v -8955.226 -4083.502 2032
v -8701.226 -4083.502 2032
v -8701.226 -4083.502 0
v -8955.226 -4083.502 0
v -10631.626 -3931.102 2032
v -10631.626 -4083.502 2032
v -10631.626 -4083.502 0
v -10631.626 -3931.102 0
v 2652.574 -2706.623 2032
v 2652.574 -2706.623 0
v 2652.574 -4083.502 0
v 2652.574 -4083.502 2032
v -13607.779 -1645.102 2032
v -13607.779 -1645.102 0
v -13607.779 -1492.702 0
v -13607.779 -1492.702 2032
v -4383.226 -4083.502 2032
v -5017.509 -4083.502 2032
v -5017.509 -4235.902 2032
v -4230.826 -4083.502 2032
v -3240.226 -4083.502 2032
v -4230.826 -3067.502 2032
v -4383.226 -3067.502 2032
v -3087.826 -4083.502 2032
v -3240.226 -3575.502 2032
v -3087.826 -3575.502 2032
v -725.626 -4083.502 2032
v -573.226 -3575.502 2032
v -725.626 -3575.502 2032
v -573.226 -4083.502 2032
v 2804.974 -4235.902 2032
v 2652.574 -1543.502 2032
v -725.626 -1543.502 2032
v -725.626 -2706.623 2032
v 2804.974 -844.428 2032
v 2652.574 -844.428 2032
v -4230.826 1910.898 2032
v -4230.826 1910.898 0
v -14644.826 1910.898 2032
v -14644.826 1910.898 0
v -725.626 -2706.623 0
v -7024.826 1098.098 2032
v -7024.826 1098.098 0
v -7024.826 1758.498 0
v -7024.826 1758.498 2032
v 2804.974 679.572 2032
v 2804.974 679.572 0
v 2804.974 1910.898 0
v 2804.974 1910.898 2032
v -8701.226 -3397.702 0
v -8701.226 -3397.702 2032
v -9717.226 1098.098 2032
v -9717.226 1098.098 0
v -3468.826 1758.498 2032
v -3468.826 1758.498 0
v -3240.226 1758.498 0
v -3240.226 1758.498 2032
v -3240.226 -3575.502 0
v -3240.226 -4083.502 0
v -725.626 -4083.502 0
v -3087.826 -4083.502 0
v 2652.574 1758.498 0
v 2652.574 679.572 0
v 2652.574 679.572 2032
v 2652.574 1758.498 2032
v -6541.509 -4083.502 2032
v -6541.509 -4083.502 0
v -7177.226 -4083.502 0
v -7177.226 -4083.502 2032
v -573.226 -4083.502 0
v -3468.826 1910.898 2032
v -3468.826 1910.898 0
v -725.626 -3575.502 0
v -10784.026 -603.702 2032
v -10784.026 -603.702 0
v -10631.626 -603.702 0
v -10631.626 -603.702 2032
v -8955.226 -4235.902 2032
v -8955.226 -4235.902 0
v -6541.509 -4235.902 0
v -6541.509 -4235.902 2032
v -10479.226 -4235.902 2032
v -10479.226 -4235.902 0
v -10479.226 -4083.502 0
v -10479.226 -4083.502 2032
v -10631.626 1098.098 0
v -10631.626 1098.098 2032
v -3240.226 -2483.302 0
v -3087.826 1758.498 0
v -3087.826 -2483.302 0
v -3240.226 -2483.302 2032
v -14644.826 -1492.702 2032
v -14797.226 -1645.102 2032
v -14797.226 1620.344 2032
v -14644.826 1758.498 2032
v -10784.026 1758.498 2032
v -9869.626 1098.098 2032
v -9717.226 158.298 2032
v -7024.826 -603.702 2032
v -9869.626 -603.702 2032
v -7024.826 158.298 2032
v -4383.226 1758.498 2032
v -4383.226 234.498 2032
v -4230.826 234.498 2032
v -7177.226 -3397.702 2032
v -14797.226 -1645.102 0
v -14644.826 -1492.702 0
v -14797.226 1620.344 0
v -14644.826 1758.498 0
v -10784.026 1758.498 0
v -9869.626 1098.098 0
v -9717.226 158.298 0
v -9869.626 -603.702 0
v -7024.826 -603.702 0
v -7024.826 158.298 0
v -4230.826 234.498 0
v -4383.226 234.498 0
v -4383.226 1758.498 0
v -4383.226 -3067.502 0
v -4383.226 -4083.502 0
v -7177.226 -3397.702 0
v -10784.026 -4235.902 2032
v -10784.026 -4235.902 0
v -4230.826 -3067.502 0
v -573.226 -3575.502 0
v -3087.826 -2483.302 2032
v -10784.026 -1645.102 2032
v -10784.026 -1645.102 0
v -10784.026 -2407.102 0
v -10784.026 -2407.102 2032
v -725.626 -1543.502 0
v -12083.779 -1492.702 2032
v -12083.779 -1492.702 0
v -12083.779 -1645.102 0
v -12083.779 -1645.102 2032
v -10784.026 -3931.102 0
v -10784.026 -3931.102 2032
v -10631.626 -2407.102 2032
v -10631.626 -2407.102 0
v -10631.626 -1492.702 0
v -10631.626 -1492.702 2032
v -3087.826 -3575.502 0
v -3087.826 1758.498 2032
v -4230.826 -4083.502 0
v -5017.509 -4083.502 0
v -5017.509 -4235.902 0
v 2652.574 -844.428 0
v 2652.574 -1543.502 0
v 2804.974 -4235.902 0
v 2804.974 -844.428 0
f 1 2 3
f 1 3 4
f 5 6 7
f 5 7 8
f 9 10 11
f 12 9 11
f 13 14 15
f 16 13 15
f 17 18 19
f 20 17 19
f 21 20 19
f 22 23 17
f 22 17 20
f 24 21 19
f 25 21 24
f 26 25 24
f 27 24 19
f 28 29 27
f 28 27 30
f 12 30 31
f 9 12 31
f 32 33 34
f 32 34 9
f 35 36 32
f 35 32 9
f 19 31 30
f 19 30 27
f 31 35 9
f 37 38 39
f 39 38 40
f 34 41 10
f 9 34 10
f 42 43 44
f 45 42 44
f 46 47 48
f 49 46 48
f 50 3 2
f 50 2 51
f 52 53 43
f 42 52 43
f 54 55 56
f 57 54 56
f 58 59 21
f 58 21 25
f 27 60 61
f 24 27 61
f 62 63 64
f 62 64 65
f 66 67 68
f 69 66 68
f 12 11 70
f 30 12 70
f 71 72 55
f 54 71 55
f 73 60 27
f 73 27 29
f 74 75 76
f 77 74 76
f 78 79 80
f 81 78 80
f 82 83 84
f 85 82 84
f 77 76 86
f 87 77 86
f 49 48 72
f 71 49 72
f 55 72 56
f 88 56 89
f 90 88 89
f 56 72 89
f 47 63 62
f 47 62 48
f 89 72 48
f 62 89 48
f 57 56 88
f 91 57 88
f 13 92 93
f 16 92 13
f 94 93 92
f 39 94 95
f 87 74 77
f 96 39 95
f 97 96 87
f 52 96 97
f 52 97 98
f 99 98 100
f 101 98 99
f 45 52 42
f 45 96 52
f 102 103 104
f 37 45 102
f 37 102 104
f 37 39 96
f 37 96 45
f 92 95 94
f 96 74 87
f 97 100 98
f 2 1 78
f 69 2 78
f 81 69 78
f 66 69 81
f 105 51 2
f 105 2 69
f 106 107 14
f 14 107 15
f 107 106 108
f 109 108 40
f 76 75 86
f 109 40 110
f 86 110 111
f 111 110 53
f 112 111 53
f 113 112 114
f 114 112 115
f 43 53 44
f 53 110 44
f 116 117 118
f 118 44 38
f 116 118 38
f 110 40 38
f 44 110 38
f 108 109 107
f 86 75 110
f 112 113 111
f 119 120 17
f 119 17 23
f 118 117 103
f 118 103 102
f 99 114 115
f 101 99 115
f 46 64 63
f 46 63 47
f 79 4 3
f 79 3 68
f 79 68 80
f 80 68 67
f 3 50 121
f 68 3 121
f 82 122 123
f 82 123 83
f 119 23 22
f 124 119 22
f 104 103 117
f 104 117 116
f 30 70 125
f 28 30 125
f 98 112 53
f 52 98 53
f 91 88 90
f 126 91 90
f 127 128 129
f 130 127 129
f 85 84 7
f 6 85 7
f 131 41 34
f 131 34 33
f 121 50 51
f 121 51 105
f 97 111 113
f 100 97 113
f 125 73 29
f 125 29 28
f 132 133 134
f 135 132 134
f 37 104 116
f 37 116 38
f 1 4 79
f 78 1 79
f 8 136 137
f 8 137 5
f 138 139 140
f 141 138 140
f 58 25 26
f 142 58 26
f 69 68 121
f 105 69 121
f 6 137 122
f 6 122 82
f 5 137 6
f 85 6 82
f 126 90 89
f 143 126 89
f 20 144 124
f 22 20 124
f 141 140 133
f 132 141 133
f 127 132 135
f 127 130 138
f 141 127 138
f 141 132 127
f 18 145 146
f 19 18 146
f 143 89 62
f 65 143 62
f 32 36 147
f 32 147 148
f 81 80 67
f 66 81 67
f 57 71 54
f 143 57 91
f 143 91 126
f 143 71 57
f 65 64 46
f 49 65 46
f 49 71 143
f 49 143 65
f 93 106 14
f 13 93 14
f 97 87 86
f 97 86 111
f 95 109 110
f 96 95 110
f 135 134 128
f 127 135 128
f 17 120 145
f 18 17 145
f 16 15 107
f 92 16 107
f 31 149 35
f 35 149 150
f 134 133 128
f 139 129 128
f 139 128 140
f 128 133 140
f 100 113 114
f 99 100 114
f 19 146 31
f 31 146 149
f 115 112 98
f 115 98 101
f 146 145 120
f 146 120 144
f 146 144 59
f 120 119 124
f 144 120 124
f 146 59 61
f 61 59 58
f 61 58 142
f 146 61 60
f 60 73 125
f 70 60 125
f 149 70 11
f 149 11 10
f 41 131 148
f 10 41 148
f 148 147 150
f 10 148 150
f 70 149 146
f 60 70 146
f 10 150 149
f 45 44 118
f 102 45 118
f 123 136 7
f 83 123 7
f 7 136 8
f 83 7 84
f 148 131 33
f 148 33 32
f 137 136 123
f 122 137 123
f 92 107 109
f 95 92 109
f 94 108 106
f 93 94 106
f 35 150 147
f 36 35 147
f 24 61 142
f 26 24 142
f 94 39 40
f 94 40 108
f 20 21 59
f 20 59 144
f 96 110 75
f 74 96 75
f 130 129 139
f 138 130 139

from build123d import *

# Parameters (mm, degrees)
F0_W     = 152.4
F0_H     = 1524
F0_W_2   = 2692.4
F0_H_2   = 660.4
F0_H_3   = 939.8
F0_H_4   = 762
F0_H_5   = 1701.8
F2_DEPTH = 2032
F0_W_3   = 3378.2
F0_H_6   = 1163.1207679749
F0_H_7   = 508
F0_H_8   = 1016
F0_H_9   = 1078.9255742073
F0_W_4   = 1524
F0_H_10  = 685.8
F0_H_11  = 152.4


with BuildPart() as f2:
    # F0 (on Top) → F2 (new body)
    with BuildSketch(Plane.XY):
        with Locations((-4307.0259521484, 996.4976905823)):
            Rectangle(F0_W, F0_H)
        Polygon((-4383.2259521484, 1758.4976905823), (-4230.8259521484, 1758.4976905823), (-4230.8259521484, 1910.8976905823), (-14644.8259521484, 1910.8976905823), (-14644.8259521484, 1758.4976905823), (-10784.0259521484, 1758.4976905823), (-10631.6259521484, 1758.4976905823), (-9869.6259521484, 1758.4976905823), (-9717.2259521484, 1758.4976905823), (-7024.8259521484, 1758.4976905823), align=None)
        with Locations((-8371.0259521484, 1428.2976905823)):
            Rectangle(F0_W_2, F0_H_2)
        Polygon((-14644.8259521484, 1758.4976905823), (-14644.8259521484, 1910.8976905823), (-14797.2259521484, 1620.3435659409), (-14797.2259521484, -1645.1023094177), (-13607.7785491943, -1645.1023094177), (-13607.7785491943, -1492.7023094177), (-14644.8259521484, -1492.7023094177), align=None)
        with Locations((-9793.4259521484, 1428.2976905823)):
            Rectangle(F0_W, F0_H_2)
        with Locations((-9793.4259521484, 628.1976905823)):
            Rectangle(F0_W, F0_H_3)
        Polygon((-9869.6259521484, 1098.0976905823), (-9869.6259521484, 1758.4976905823), (-10631.6259521484, 1758.4976905823), (-10784.0259521484, 1758.4976905823), (-10784.0259521484, 1098.0976905823), (-10631.6259521484, 1098.0976905823), align=None)
        with Locations((-9793.4259521484, -222.7023094177)):
            Rectangle(F0_W, F0_H_4)
        with Locations((-8371.0259521484, -222.7023094177)):
            Rectangle(F0_W_2, F0_H_4)
        with Locations((-10707.8259521484, 247.1976905823)):
            Rectangle(F0_W, F0_H_5)
    extrude(amount=F2_DEPTH)


with BuildPart() as f2b:
    # F0 (on Top) → F2, piece 2 (new body)
    with BuildSketch(Plane.XY):
        Polygon((2804.9740478516, -844.427883625), (2652.5740478516, -844.427883625), (2652.5740478516, -1543.5023094177), (2652.5740478516, -2706.6230773926), (2652.5740478516, -4083.5023094177), (-573.2259521484, -4083.5023094177), (-725.6259521484, -4083.5023094177), (-3087.8259521484, -4083.5023094177), (-3240.2259521484, -4083.5023094177), (-4230.8259521484, -4083.5023094177), (-4383.2259521484, -4083.5023094177), (-5017.5086746216, -4083.5023094177), (-5017.5086746216, -4235.9023094177), (2804.9740478516, -4235.9023094177), align=None)
        with Locations((963.4740478516, -2125.0626934051)):
            Rectangle(F0_W_3, F0_H_6)
        with Locations((-649.4259521484, -3829.5023094177)):
            Rectangle(F0_W, F0_H_7)
        with Locations((-4307.0259521484, -3575.5023094177)):
            Rectangle(F0_W, F0_H_8)
        with Locations((-3164.0259521484, -3829.5023094177)):
            Rectangle(F0_W, F0_H_7)
    extrude(amount=F2_DEPTH)


with BuildPart() as f2c:
    # F0 (on Top) → F2, piece 3 (new body)
    with BuildSketch(Plane.XY):
        with Locations((2728.7740478516, 1219.0349034786)):
            Rectangle(F0_W, F0_H_9)
        Polygon((-3087.8259521484, 1758.4976905823), (2652.5740478516, 1758.4976905823), (2804.9740478516, 1758.4976905823), (2804.9740478516, 1910.8976905823), (-3468.8259521484, 1910.8976905823), (-3468.8259521484, 1758.4976905823), (-3240.2259521484, 1758.4976905823), align=None)
        Polygon((-3087.8259521484, -1543.5023094177), (-3087.8259521484, 1758.4976905823), (-3240.2259521484, 1758.4976905823), (-3240.2259521484, -2483.3023094177), (-3087.8259521484, -2483.3023094177), align=None)
    extrude(amount=F2_DEPTH)


with BuildPart() as f2d:
    # F0 (on Top) → F2, piece 4 (new body)
    with BuildSketch(Plane.XY):
        Polygon((-6541.5086746216, -4235.9023094177), (-6541.5086746216, -4083.5023094177), (-7177.2259521484, -4083.5023094177), (-8701.2259521484, -4083.5023094177), (-8955.2259521484, -4083.5023094177), (-8955.2259521484, -4235.9023094177), align=None)
        with Locations((-7939.2259521484, -3740.6023094177)):
            Rectangle(F0_W_4, F0_H_10)
    extrude(amount=F2_DEPTH)


with BuildPart() as f2e:
    # F0 (on Top) → F2, piece 5 (new body)
    with BuildSketch(Plane.XY):
        Polygon((-10631.6259521484, -1645.1023094177), (-10631.6259521484, -1492.7023094177), (-12083.7785491943, -1492.7023094177), (-12083.7785491943, -1645.1023094177), (-10784.0259521484, -1645.1023094177), (-10784.0259521484, -2407.1023094177), (-10631.6259521484, -2407.1023094177), align=None)
    extrude(amount=F2_DEPTH)


with BuildPart() as f2f:
    # F0 (on Top) → F2, piece 6 (new body)
    with BuildSketch(Plane.XY):
        Polygon((-10479.2259521484, -4083.5023094177), (-10631.6259521484, -4083.5023094177), (-10784.0259521484, -4083.5023094177), (-10784.0259521484, -4235.9023094177), (-10479.2259521484, -4235.9023094177), align=None)
        with Locations((-10707.8259521484, -4007.3023094177)):
            Rectangle(F0_W, F0_H_11)
    extrude(amount=F2_DEPTH)


solid = Compound([f2.part, f2b.part, f2c.part, f2d.part, f2e.part, f2f.part])
